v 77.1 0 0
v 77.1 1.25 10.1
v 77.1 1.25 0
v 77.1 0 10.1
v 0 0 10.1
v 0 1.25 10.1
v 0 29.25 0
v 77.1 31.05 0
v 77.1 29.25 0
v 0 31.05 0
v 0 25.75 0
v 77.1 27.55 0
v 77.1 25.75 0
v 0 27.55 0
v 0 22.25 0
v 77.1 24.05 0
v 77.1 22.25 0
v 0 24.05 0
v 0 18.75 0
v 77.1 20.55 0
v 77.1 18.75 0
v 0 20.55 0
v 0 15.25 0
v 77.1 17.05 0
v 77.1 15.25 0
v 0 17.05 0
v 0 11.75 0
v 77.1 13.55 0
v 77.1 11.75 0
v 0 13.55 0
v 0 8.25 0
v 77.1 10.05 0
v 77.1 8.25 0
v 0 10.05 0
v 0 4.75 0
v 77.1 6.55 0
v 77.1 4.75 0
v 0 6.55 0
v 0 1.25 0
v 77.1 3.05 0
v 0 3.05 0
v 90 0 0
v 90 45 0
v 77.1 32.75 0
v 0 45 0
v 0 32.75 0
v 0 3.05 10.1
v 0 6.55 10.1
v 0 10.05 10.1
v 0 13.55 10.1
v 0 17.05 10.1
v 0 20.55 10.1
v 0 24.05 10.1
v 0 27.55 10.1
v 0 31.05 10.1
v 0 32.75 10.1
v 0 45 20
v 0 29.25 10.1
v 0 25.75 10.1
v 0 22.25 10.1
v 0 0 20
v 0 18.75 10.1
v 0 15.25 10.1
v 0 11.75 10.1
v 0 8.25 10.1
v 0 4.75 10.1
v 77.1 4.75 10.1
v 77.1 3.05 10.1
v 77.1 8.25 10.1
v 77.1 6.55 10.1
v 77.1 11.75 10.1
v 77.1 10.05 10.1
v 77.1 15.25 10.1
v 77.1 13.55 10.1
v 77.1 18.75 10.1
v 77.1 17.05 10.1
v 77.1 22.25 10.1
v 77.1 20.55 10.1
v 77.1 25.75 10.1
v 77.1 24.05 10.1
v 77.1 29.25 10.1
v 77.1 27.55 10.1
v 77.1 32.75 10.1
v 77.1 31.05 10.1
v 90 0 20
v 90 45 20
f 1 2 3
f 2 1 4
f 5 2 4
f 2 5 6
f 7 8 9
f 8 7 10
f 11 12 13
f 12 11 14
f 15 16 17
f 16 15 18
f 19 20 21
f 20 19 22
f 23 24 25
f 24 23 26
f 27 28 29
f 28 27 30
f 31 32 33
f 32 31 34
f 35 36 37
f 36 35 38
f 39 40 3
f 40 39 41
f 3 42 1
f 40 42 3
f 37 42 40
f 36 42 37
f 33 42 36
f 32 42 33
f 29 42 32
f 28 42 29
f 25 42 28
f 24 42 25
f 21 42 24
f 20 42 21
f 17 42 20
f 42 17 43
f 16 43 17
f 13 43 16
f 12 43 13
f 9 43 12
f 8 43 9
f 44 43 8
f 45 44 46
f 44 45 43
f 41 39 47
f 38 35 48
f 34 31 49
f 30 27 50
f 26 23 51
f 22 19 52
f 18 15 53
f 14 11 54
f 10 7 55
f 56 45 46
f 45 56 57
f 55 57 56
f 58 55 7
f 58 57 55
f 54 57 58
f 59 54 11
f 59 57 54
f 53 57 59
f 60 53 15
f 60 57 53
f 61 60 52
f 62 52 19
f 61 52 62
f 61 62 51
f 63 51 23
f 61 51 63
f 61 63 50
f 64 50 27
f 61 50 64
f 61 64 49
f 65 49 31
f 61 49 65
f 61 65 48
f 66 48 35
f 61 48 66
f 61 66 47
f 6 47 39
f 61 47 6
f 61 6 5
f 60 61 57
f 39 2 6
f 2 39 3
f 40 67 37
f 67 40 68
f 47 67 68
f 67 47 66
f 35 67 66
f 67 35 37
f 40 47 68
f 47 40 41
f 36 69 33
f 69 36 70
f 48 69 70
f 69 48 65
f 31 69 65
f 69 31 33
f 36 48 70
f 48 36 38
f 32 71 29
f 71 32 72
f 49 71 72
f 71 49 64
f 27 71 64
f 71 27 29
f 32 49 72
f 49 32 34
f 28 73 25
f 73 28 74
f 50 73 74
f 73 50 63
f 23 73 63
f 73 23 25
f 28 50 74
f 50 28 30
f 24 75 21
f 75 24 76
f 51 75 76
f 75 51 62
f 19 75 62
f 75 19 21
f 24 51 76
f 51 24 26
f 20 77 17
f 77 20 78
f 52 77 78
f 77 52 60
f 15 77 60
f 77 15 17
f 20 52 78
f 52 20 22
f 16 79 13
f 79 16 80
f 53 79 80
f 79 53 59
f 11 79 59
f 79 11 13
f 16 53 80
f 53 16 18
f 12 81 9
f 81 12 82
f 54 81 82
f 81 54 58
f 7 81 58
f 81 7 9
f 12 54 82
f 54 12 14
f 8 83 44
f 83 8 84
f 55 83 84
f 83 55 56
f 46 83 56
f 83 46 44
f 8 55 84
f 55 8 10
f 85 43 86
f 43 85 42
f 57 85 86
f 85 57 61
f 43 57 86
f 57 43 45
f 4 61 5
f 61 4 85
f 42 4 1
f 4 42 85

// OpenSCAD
$fn = 128; // High resolution for smooth slot edges

// --- Dimensions ---
// Base block dimensions
base_length_X = 90;
base_width_Y = 45;
base_height_Z = 20;

// Slide dimensions (mm)
slide_length = 75;
slide_width = 25;
slide_thickness = 1;

// Slot dimensions
slot_length = 77; // Must be >= slide_length to fit
slot_width = 1.6; // Width of the slot (gap between slides)
slot_depth = 10; // Depth of the cut into the block

// Slot spacing and positioning
slot_spacing_Y = 3.5; // Centre-to-centre distance between slots
num_slots = 10;

// --- Calculation ---
// Calculate the total width occupied by the slots and gaps
// Formula: (num_slots * slot_width) + ((num_slots - 1) * slot_spacing_Y)
total_slot_group_width = (num_slots * slot_width) + ((num_slots - 1) * slot_spacing_Y);

// Calculate offset to center the group of slots on the block width
// Center of block = base_width_Y / 2
// Center of slot group = total_slot_group_width / 2
// Offset = Center of block - Center of slot group
slot_group_offset_Y = (base_width_Y / 2) - (total_slot_group_width / 2);

// --- Build ---

difference() {
    // 1. Create the solid base block
    // Oriented on XY plane, building up Z. Centred on origin.
    translate([0, 0, 0])
    cube([base_length_X, base_width_Y, base_height_Z]);

    // 2. Cut the 10 parallel slots
    // Slots run along X, so we extrude a rectangle along X.
    // We use difference() to cut them out.
    // The cutting shape extends slightly past the faces (rule 5) to ensure clean cuts.
    for (i = [0 : num_slots - 1]) {
        y_center = slot_group_offset_Y + (slot_width / 2) + (i * slot_spacing_Y);
        
        translate([0, y_center, 0])
        // Slot dimensions:
        // X: slot_length + 0.1 (overshoot)
        // Y: slot_width + 0.1 (overshoot)
        // Z: slot_depth + 0.1 (overshoot)
        cube([slot_length + 0.1, slot_width + 0.1, slot_depth + 0.1]);
    }
}
